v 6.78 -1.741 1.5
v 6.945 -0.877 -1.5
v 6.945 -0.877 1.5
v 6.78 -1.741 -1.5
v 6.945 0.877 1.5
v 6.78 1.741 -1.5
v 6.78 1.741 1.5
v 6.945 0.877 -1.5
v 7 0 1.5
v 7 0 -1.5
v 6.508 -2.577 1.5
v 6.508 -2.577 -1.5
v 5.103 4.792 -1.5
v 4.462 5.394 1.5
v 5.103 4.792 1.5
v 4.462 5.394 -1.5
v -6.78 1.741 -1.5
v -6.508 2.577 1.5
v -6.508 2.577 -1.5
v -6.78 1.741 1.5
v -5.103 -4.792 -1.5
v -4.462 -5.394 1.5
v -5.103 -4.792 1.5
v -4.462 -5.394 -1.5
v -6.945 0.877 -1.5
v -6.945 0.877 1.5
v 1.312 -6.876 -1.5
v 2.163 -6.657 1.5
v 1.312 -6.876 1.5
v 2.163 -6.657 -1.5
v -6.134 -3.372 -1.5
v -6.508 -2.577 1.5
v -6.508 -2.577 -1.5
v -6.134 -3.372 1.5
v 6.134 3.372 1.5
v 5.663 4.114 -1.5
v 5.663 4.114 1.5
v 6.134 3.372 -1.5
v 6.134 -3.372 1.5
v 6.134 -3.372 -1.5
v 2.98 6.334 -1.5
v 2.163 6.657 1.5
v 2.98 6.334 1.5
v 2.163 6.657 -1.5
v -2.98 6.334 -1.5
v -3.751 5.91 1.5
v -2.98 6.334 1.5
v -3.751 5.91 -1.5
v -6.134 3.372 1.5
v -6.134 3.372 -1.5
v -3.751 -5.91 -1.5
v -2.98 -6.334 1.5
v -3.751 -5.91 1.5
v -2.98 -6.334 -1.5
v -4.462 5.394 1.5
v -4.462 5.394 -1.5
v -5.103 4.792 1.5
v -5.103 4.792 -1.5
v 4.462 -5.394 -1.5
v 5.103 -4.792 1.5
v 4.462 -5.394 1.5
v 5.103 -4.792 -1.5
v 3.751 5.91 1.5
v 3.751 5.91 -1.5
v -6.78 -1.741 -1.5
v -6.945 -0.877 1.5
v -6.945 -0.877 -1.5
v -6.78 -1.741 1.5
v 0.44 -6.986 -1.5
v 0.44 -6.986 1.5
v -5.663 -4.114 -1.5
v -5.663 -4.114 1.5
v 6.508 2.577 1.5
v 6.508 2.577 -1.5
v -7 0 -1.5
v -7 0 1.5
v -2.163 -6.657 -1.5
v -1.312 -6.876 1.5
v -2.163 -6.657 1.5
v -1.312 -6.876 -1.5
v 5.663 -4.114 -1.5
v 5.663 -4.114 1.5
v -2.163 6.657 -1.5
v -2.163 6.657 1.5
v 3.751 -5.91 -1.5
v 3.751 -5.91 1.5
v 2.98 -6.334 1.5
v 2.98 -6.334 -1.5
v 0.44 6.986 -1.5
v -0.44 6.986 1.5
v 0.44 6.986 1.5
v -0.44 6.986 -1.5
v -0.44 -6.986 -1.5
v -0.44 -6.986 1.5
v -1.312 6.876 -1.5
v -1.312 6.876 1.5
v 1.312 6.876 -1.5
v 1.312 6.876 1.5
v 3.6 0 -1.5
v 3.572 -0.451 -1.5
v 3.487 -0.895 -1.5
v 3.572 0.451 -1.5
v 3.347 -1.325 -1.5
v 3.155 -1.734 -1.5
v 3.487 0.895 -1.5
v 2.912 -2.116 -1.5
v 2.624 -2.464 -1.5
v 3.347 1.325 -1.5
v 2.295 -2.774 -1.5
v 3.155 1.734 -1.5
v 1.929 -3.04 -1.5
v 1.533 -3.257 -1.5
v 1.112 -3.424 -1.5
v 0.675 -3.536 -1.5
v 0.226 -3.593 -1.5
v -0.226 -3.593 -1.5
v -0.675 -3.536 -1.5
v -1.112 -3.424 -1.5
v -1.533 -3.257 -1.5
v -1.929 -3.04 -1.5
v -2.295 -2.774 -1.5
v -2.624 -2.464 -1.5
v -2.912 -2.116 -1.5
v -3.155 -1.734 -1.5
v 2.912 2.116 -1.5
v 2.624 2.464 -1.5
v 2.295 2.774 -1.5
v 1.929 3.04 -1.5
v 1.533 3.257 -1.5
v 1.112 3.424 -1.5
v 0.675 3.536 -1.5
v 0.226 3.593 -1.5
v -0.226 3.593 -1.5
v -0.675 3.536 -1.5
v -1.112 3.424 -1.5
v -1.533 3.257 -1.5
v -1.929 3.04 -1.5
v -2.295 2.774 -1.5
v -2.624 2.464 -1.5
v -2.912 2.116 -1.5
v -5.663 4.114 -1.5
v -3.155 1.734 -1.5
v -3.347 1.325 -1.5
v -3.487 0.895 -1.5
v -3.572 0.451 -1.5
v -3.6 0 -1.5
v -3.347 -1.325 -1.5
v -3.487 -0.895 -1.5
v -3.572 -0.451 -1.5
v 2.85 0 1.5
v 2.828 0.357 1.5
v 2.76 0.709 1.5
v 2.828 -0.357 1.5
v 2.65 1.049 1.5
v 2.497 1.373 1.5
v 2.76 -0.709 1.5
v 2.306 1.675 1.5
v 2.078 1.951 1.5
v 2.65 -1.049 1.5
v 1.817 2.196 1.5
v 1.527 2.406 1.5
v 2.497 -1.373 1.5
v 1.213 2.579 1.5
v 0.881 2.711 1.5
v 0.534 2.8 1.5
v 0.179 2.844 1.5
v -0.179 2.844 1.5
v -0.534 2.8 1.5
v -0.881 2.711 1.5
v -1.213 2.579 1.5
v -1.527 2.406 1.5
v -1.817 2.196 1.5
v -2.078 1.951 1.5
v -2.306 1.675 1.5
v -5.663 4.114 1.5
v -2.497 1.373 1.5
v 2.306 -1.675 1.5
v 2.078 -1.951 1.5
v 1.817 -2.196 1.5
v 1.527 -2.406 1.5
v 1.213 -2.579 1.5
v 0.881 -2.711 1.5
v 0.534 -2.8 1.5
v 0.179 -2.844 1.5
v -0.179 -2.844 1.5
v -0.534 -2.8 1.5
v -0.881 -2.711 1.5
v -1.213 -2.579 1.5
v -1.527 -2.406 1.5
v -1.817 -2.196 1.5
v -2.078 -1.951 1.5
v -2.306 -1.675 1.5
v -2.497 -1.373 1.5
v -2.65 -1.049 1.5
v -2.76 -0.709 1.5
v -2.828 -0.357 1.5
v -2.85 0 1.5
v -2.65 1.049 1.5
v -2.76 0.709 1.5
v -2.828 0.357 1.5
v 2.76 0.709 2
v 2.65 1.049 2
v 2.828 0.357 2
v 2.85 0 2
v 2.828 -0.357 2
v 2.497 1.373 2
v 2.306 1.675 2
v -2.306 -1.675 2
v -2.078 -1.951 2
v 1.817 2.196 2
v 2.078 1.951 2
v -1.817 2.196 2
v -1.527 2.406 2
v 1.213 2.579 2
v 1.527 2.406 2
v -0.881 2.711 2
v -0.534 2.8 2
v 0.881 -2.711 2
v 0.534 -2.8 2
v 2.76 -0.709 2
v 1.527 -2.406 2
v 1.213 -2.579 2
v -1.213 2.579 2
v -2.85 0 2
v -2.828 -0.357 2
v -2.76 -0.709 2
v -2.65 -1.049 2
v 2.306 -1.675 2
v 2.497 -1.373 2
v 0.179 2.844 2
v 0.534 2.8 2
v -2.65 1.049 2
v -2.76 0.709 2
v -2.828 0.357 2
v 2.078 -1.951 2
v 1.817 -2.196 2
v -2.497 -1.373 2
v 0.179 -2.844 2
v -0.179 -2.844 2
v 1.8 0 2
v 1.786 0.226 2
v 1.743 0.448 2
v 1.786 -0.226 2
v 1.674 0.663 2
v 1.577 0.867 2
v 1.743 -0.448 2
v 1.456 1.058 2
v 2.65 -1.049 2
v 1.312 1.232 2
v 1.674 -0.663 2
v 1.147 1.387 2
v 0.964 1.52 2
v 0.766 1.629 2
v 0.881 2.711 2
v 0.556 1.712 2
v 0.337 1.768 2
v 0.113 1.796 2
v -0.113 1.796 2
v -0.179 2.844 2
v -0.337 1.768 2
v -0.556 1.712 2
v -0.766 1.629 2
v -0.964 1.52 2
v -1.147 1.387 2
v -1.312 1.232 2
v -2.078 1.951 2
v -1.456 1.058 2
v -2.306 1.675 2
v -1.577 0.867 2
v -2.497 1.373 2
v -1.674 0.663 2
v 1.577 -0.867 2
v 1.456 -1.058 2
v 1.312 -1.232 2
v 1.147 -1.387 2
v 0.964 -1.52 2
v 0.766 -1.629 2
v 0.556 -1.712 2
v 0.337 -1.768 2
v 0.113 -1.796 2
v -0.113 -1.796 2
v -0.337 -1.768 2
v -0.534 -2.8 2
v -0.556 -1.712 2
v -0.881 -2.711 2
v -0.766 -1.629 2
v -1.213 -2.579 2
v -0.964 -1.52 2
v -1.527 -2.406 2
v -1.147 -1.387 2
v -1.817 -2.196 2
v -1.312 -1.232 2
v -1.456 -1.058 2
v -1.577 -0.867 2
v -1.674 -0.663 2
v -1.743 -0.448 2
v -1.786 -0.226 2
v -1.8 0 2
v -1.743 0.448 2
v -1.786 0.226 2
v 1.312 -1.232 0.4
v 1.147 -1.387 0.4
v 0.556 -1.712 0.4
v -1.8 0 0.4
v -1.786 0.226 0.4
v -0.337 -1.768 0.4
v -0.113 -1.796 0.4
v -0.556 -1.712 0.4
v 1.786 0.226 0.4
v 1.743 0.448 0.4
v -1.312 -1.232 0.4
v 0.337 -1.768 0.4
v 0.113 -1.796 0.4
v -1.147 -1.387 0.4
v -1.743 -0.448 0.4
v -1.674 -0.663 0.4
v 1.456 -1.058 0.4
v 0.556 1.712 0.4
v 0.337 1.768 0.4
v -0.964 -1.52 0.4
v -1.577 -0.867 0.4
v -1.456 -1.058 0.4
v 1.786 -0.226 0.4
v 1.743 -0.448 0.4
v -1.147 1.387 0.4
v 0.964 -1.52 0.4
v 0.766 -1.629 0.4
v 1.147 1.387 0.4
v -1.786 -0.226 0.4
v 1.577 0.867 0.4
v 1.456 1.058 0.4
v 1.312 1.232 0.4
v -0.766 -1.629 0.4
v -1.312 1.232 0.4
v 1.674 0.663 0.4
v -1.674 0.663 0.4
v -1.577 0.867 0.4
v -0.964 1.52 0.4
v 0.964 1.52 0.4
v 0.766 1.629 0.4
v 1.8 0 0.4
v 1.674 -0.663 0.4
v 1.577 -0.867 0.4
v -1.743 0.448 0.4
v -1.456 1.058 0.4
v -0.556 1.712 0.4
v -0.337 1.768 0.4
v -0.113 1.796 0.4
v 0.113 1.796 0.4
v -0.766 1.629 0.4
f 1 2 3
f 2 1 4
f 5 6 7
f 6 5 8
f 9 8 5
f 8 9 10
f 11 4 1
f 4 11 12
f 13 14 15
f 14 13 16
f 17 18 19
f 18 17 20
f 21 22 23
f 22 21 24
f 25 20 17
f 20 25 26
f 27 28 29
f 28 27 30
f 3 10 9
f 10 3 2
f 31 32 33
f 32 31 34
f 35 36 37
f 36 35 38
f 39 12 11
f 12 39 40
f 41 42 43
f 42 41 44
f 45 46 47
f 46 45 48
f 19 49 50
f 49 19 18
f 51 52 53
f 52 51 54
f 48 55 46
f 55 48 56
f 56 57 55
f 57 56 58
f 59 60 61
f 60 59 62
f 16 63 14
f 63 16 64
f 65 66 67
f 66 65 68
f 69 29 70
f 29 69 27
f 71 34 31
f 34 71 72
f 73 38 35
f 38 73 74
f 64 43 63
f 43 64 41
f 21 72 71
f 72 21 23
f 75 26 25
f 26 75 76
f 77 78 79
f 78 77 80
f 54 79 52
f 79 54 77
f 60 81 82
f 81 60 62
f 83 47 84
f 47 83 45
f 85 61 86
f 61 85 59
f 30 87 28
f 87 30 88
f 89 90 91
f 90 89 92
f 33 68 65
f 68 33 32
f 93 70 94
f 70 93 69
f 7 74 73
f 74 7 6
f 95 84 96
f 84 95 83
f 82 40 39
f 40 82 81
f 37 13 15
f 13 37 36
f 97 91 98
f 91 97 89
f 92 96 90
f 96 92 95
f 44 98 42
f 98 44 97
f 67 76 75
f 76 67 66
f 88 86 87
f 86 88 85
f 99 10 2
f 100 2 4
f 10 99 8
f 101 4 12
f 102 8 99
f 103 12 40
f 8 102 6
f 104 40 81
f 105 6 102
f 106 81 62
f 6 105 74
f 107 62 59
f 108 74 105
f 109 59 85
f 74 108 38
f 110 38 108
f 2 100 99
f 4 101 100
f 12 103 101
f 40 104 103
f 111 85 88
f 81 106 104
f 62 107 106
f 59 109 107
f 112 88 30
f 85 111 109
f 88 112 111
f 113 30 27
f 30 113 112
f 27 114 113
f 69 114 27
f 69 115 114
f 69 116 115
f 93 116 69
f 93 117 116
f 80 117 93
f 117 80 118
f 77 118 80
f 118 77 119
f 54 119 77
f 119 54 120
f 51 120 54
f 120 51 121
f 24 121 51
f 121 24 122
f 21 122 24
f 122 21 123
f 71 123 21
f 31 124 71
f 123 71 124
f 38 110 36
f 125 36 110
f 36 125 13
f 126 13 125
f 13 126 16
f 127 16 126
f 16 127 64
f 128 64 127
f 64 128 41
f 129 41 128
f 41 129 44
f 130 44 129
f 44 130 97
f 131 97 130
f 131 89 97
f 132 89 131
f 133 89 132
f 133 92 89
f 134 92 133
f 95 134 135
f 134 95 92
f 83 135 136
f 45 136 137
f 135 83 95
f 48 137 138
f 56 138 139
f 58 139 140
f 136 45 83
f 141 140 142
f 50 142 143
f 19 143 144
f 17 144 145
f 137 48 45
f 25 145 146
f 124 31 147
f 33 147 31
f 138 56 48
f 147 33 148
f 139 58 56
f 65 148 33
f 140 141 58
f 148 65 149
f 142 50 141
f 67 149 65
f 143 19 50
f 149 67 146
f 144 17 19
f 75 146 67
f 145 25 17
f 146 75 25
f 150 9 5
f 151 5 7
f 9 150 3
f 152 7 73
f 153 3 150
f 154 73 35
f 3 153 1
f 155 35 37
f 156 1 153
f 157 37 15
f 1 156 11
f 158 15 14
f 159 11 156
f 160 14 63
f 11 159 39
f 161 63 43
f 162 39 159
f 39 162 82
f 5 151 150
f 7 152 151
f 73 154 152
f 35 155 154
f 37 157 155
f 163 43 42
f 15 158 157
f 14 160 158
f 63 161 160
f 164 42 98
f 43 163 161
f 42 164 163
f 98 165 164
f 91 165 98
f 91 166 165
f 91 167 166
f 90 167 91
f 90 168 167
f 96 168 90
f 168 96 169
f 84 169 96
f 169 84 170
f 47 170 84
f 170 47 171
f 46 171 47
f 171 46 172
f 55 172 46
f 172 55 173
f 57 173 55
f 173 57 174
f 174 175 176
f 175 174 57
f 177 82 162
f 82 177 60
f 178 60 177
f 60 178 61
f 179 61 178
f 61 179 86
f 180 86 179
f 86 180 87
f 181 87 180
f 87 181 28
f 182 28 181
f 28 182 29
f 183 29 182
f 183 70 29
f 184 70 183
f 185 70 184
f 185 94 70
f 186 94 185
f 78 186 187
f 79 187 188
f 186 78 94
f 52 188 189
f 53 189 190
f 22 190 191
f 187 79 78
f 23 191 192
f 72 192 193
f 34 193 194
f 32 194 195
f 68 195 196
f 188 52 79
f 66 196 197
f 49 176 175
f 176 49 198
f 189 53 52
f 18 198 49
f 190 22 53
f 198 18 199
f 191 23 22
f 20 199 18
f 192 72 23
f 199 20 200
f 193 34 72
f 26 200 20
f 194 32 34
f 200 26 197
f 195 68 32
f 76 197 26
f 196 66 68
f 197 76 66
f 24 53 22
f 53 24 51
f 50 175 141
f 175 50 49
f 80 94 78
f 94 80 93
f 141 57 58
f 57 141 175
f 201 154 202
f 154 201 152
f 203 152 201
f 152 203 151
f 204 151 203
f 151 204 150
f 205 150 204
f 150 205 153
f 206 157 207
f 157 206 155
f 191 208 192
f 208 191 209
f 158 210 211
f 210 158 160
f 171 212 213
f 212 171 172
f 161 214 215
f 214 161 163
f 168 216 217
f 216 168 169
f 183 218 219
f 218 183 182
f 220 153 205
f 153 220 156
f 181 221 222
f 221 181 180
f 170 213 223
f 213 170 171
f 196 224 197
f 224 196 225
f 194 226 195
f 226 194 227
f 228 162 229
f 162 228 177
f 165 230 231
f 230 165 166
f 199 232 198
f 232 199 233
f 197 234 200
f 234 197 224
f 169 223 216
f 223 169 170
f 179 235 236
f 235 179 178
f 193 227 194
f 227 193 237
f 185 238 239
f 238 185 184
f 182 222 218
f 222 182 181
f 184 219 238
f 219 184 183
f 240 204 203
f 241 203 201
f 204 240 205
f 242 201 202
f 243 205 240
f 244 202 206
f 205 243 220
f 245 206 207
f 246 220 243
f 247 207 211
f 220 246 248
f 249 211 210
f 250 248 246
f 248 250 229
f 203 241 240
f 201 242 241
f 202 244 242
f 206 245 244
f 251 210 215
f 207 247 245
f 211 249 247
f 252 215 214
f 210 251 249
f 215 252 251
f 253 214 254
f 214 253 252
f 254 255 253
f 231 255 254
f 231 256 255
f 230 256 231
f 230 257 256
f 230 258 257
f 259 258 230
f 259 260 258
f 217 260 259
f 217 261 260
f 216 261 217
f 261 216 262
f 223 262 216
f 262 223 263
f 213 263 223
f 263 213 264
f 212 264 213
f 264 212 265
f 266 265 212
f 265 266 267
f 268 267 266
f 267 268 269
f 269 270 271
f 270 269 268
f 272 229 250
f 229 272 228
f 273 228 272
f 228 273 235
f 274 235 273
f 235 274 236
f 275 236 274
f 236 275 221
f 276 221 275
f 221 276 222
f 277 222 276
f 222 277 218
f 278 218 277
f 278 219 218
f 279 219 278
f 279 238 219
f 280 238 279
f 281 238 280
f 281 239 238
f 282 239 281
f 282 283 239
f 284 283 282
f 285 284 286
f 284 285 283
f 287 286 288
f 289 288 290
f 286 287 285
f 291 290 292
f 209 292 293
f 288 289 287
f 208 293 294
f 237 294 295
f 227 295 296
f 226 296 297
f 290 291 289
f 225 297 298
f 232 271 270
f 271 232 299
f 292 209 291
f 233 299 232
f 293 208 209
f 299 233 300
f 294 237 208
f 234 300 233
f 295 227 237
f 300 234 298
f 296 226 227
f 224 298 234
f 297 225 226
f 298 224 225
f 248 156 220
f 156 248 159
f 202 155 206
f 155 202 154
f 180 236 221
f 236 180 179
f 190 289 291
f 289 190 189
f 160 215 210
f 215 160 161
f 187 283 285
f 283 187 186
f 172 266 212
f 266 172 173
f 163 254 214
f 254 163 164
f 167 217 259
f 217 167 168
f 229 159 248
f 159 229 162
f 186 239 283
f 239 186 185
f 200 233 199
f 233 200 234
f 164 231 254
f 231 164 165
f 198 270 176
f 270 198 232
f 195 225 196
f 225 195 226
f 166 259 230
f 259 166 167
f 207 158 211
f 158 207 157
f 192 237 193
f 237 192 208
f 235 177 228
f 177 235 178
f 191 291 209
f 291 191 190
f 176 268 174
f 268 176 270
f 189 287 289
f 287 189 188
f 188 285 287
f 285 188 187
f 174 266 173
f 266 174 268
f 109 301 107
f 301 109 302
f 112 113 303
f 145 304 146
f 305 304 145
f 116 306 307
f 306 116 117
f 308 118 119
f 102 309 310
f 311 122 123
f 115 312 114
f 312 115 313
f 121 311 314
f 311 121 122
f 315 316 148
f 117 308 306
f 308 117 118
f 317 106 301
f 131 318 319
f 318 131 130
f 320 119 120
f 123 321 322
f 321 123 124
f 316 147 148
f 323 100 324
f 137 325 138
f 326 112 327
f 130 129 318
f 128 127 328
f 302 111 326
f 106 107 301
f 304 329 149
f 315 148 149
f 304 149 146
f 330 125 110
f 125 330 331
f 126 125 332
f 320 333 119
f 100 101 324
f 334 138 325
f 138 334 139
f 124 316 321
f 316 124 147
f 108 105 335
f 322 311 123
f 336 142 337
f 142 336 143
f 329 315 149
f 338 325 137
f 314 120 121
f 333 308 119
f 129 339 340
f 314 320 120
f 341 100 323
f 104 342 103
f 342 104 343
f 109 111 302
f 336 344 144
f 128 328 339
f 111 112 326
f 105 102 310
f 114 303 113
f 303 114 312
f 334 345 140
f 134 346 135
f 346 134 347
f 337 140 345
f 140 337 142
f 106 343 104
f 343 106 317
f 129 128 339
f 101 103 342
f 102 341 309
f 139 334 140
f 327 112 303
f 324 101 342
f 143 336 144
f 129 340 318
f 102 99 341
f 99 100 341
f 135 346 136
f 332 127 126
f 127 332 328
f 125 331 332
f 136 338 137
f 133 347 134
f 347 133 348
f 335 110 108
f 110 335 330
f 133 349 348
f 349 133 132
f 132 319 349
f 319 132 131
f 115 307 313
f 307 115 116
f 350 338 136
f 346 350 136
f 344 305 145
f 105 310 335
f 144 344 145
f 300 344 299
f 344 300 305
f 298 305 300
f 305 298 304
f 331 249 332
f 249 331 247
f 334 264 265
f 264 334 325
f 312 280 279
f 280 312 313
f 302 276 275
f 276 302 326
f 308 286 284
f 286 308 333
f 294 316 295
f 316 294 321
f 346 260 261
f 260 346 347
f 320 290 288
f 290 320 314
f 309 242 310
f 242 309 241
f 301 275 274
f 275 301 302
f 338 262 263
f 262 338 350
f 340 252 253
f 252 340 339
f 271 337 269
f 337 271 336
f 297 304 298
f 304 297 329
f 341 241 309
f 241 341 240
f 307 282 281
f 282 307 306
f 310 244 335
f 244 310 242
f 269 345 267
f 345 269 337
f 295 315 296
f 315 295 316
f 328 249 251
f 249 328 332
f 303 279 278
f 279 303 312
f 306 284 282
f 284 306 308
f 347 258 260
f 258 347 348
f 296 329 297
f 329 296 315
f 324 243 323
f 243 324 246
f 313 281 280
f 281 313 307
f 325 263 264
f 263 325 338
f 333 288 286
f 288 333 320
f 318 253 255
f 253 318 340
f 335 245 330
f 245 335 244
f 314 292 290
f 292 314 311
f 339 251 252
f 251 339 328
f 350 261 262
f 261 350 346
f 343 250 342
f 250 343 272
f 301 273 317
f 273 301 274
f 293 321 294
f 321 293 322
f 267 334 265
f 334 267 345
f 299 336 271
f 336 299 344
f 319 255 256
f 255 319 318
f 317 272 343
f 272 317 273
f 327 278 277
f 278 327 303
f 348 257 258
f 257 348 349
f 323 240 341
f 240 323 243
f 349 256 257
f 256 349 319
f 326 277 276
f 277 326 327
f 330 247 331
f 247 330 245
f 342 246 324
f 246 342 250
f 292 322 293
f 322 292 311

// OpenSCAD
$fn = 50;


difference() {
	union() {
		translate(v = [0, 0, -1.5000000000]) {
			cylinder(h = 3, r = 7.0000000000);
		}
		translate(v = [0, 0, -1.5000000000]) {
			cylinder(h = 3.5000000000, r = 2.8500000000);
		}
	}
	union() {
		translate(v = [0, 0, -1.5000000000]) {
			rotate(a = [0, 180, 0]) {
				difference() {
					union() {
						translate(v = [0, 0, -3.5000000000]) {
							cylinder(h = 3.5000000000, r = 1.5000000000);
						}
						translate(v = [0, 0, -1.9000000000]) {
							cylinder(h = 1.9000000000, r1 = 1.8000000000, r2 = 3.6000000000);
						}
						translate(v = [0, 0, -3.5000000000]) {
							cylinder(h = 3.5000000000, r = 1.8000000000);
						}
						translate(v = [0, 0, -3.5000000000]) {
							cylinder(h = 3.5000000000, r = 1.5000000000);
						}
					}
					union();
				}
			}
		}
		translate(v = [0, 0, -100.0000000000]) {
			cylinder(h = 200, r = 1.8000000000);
		}
	}
}
